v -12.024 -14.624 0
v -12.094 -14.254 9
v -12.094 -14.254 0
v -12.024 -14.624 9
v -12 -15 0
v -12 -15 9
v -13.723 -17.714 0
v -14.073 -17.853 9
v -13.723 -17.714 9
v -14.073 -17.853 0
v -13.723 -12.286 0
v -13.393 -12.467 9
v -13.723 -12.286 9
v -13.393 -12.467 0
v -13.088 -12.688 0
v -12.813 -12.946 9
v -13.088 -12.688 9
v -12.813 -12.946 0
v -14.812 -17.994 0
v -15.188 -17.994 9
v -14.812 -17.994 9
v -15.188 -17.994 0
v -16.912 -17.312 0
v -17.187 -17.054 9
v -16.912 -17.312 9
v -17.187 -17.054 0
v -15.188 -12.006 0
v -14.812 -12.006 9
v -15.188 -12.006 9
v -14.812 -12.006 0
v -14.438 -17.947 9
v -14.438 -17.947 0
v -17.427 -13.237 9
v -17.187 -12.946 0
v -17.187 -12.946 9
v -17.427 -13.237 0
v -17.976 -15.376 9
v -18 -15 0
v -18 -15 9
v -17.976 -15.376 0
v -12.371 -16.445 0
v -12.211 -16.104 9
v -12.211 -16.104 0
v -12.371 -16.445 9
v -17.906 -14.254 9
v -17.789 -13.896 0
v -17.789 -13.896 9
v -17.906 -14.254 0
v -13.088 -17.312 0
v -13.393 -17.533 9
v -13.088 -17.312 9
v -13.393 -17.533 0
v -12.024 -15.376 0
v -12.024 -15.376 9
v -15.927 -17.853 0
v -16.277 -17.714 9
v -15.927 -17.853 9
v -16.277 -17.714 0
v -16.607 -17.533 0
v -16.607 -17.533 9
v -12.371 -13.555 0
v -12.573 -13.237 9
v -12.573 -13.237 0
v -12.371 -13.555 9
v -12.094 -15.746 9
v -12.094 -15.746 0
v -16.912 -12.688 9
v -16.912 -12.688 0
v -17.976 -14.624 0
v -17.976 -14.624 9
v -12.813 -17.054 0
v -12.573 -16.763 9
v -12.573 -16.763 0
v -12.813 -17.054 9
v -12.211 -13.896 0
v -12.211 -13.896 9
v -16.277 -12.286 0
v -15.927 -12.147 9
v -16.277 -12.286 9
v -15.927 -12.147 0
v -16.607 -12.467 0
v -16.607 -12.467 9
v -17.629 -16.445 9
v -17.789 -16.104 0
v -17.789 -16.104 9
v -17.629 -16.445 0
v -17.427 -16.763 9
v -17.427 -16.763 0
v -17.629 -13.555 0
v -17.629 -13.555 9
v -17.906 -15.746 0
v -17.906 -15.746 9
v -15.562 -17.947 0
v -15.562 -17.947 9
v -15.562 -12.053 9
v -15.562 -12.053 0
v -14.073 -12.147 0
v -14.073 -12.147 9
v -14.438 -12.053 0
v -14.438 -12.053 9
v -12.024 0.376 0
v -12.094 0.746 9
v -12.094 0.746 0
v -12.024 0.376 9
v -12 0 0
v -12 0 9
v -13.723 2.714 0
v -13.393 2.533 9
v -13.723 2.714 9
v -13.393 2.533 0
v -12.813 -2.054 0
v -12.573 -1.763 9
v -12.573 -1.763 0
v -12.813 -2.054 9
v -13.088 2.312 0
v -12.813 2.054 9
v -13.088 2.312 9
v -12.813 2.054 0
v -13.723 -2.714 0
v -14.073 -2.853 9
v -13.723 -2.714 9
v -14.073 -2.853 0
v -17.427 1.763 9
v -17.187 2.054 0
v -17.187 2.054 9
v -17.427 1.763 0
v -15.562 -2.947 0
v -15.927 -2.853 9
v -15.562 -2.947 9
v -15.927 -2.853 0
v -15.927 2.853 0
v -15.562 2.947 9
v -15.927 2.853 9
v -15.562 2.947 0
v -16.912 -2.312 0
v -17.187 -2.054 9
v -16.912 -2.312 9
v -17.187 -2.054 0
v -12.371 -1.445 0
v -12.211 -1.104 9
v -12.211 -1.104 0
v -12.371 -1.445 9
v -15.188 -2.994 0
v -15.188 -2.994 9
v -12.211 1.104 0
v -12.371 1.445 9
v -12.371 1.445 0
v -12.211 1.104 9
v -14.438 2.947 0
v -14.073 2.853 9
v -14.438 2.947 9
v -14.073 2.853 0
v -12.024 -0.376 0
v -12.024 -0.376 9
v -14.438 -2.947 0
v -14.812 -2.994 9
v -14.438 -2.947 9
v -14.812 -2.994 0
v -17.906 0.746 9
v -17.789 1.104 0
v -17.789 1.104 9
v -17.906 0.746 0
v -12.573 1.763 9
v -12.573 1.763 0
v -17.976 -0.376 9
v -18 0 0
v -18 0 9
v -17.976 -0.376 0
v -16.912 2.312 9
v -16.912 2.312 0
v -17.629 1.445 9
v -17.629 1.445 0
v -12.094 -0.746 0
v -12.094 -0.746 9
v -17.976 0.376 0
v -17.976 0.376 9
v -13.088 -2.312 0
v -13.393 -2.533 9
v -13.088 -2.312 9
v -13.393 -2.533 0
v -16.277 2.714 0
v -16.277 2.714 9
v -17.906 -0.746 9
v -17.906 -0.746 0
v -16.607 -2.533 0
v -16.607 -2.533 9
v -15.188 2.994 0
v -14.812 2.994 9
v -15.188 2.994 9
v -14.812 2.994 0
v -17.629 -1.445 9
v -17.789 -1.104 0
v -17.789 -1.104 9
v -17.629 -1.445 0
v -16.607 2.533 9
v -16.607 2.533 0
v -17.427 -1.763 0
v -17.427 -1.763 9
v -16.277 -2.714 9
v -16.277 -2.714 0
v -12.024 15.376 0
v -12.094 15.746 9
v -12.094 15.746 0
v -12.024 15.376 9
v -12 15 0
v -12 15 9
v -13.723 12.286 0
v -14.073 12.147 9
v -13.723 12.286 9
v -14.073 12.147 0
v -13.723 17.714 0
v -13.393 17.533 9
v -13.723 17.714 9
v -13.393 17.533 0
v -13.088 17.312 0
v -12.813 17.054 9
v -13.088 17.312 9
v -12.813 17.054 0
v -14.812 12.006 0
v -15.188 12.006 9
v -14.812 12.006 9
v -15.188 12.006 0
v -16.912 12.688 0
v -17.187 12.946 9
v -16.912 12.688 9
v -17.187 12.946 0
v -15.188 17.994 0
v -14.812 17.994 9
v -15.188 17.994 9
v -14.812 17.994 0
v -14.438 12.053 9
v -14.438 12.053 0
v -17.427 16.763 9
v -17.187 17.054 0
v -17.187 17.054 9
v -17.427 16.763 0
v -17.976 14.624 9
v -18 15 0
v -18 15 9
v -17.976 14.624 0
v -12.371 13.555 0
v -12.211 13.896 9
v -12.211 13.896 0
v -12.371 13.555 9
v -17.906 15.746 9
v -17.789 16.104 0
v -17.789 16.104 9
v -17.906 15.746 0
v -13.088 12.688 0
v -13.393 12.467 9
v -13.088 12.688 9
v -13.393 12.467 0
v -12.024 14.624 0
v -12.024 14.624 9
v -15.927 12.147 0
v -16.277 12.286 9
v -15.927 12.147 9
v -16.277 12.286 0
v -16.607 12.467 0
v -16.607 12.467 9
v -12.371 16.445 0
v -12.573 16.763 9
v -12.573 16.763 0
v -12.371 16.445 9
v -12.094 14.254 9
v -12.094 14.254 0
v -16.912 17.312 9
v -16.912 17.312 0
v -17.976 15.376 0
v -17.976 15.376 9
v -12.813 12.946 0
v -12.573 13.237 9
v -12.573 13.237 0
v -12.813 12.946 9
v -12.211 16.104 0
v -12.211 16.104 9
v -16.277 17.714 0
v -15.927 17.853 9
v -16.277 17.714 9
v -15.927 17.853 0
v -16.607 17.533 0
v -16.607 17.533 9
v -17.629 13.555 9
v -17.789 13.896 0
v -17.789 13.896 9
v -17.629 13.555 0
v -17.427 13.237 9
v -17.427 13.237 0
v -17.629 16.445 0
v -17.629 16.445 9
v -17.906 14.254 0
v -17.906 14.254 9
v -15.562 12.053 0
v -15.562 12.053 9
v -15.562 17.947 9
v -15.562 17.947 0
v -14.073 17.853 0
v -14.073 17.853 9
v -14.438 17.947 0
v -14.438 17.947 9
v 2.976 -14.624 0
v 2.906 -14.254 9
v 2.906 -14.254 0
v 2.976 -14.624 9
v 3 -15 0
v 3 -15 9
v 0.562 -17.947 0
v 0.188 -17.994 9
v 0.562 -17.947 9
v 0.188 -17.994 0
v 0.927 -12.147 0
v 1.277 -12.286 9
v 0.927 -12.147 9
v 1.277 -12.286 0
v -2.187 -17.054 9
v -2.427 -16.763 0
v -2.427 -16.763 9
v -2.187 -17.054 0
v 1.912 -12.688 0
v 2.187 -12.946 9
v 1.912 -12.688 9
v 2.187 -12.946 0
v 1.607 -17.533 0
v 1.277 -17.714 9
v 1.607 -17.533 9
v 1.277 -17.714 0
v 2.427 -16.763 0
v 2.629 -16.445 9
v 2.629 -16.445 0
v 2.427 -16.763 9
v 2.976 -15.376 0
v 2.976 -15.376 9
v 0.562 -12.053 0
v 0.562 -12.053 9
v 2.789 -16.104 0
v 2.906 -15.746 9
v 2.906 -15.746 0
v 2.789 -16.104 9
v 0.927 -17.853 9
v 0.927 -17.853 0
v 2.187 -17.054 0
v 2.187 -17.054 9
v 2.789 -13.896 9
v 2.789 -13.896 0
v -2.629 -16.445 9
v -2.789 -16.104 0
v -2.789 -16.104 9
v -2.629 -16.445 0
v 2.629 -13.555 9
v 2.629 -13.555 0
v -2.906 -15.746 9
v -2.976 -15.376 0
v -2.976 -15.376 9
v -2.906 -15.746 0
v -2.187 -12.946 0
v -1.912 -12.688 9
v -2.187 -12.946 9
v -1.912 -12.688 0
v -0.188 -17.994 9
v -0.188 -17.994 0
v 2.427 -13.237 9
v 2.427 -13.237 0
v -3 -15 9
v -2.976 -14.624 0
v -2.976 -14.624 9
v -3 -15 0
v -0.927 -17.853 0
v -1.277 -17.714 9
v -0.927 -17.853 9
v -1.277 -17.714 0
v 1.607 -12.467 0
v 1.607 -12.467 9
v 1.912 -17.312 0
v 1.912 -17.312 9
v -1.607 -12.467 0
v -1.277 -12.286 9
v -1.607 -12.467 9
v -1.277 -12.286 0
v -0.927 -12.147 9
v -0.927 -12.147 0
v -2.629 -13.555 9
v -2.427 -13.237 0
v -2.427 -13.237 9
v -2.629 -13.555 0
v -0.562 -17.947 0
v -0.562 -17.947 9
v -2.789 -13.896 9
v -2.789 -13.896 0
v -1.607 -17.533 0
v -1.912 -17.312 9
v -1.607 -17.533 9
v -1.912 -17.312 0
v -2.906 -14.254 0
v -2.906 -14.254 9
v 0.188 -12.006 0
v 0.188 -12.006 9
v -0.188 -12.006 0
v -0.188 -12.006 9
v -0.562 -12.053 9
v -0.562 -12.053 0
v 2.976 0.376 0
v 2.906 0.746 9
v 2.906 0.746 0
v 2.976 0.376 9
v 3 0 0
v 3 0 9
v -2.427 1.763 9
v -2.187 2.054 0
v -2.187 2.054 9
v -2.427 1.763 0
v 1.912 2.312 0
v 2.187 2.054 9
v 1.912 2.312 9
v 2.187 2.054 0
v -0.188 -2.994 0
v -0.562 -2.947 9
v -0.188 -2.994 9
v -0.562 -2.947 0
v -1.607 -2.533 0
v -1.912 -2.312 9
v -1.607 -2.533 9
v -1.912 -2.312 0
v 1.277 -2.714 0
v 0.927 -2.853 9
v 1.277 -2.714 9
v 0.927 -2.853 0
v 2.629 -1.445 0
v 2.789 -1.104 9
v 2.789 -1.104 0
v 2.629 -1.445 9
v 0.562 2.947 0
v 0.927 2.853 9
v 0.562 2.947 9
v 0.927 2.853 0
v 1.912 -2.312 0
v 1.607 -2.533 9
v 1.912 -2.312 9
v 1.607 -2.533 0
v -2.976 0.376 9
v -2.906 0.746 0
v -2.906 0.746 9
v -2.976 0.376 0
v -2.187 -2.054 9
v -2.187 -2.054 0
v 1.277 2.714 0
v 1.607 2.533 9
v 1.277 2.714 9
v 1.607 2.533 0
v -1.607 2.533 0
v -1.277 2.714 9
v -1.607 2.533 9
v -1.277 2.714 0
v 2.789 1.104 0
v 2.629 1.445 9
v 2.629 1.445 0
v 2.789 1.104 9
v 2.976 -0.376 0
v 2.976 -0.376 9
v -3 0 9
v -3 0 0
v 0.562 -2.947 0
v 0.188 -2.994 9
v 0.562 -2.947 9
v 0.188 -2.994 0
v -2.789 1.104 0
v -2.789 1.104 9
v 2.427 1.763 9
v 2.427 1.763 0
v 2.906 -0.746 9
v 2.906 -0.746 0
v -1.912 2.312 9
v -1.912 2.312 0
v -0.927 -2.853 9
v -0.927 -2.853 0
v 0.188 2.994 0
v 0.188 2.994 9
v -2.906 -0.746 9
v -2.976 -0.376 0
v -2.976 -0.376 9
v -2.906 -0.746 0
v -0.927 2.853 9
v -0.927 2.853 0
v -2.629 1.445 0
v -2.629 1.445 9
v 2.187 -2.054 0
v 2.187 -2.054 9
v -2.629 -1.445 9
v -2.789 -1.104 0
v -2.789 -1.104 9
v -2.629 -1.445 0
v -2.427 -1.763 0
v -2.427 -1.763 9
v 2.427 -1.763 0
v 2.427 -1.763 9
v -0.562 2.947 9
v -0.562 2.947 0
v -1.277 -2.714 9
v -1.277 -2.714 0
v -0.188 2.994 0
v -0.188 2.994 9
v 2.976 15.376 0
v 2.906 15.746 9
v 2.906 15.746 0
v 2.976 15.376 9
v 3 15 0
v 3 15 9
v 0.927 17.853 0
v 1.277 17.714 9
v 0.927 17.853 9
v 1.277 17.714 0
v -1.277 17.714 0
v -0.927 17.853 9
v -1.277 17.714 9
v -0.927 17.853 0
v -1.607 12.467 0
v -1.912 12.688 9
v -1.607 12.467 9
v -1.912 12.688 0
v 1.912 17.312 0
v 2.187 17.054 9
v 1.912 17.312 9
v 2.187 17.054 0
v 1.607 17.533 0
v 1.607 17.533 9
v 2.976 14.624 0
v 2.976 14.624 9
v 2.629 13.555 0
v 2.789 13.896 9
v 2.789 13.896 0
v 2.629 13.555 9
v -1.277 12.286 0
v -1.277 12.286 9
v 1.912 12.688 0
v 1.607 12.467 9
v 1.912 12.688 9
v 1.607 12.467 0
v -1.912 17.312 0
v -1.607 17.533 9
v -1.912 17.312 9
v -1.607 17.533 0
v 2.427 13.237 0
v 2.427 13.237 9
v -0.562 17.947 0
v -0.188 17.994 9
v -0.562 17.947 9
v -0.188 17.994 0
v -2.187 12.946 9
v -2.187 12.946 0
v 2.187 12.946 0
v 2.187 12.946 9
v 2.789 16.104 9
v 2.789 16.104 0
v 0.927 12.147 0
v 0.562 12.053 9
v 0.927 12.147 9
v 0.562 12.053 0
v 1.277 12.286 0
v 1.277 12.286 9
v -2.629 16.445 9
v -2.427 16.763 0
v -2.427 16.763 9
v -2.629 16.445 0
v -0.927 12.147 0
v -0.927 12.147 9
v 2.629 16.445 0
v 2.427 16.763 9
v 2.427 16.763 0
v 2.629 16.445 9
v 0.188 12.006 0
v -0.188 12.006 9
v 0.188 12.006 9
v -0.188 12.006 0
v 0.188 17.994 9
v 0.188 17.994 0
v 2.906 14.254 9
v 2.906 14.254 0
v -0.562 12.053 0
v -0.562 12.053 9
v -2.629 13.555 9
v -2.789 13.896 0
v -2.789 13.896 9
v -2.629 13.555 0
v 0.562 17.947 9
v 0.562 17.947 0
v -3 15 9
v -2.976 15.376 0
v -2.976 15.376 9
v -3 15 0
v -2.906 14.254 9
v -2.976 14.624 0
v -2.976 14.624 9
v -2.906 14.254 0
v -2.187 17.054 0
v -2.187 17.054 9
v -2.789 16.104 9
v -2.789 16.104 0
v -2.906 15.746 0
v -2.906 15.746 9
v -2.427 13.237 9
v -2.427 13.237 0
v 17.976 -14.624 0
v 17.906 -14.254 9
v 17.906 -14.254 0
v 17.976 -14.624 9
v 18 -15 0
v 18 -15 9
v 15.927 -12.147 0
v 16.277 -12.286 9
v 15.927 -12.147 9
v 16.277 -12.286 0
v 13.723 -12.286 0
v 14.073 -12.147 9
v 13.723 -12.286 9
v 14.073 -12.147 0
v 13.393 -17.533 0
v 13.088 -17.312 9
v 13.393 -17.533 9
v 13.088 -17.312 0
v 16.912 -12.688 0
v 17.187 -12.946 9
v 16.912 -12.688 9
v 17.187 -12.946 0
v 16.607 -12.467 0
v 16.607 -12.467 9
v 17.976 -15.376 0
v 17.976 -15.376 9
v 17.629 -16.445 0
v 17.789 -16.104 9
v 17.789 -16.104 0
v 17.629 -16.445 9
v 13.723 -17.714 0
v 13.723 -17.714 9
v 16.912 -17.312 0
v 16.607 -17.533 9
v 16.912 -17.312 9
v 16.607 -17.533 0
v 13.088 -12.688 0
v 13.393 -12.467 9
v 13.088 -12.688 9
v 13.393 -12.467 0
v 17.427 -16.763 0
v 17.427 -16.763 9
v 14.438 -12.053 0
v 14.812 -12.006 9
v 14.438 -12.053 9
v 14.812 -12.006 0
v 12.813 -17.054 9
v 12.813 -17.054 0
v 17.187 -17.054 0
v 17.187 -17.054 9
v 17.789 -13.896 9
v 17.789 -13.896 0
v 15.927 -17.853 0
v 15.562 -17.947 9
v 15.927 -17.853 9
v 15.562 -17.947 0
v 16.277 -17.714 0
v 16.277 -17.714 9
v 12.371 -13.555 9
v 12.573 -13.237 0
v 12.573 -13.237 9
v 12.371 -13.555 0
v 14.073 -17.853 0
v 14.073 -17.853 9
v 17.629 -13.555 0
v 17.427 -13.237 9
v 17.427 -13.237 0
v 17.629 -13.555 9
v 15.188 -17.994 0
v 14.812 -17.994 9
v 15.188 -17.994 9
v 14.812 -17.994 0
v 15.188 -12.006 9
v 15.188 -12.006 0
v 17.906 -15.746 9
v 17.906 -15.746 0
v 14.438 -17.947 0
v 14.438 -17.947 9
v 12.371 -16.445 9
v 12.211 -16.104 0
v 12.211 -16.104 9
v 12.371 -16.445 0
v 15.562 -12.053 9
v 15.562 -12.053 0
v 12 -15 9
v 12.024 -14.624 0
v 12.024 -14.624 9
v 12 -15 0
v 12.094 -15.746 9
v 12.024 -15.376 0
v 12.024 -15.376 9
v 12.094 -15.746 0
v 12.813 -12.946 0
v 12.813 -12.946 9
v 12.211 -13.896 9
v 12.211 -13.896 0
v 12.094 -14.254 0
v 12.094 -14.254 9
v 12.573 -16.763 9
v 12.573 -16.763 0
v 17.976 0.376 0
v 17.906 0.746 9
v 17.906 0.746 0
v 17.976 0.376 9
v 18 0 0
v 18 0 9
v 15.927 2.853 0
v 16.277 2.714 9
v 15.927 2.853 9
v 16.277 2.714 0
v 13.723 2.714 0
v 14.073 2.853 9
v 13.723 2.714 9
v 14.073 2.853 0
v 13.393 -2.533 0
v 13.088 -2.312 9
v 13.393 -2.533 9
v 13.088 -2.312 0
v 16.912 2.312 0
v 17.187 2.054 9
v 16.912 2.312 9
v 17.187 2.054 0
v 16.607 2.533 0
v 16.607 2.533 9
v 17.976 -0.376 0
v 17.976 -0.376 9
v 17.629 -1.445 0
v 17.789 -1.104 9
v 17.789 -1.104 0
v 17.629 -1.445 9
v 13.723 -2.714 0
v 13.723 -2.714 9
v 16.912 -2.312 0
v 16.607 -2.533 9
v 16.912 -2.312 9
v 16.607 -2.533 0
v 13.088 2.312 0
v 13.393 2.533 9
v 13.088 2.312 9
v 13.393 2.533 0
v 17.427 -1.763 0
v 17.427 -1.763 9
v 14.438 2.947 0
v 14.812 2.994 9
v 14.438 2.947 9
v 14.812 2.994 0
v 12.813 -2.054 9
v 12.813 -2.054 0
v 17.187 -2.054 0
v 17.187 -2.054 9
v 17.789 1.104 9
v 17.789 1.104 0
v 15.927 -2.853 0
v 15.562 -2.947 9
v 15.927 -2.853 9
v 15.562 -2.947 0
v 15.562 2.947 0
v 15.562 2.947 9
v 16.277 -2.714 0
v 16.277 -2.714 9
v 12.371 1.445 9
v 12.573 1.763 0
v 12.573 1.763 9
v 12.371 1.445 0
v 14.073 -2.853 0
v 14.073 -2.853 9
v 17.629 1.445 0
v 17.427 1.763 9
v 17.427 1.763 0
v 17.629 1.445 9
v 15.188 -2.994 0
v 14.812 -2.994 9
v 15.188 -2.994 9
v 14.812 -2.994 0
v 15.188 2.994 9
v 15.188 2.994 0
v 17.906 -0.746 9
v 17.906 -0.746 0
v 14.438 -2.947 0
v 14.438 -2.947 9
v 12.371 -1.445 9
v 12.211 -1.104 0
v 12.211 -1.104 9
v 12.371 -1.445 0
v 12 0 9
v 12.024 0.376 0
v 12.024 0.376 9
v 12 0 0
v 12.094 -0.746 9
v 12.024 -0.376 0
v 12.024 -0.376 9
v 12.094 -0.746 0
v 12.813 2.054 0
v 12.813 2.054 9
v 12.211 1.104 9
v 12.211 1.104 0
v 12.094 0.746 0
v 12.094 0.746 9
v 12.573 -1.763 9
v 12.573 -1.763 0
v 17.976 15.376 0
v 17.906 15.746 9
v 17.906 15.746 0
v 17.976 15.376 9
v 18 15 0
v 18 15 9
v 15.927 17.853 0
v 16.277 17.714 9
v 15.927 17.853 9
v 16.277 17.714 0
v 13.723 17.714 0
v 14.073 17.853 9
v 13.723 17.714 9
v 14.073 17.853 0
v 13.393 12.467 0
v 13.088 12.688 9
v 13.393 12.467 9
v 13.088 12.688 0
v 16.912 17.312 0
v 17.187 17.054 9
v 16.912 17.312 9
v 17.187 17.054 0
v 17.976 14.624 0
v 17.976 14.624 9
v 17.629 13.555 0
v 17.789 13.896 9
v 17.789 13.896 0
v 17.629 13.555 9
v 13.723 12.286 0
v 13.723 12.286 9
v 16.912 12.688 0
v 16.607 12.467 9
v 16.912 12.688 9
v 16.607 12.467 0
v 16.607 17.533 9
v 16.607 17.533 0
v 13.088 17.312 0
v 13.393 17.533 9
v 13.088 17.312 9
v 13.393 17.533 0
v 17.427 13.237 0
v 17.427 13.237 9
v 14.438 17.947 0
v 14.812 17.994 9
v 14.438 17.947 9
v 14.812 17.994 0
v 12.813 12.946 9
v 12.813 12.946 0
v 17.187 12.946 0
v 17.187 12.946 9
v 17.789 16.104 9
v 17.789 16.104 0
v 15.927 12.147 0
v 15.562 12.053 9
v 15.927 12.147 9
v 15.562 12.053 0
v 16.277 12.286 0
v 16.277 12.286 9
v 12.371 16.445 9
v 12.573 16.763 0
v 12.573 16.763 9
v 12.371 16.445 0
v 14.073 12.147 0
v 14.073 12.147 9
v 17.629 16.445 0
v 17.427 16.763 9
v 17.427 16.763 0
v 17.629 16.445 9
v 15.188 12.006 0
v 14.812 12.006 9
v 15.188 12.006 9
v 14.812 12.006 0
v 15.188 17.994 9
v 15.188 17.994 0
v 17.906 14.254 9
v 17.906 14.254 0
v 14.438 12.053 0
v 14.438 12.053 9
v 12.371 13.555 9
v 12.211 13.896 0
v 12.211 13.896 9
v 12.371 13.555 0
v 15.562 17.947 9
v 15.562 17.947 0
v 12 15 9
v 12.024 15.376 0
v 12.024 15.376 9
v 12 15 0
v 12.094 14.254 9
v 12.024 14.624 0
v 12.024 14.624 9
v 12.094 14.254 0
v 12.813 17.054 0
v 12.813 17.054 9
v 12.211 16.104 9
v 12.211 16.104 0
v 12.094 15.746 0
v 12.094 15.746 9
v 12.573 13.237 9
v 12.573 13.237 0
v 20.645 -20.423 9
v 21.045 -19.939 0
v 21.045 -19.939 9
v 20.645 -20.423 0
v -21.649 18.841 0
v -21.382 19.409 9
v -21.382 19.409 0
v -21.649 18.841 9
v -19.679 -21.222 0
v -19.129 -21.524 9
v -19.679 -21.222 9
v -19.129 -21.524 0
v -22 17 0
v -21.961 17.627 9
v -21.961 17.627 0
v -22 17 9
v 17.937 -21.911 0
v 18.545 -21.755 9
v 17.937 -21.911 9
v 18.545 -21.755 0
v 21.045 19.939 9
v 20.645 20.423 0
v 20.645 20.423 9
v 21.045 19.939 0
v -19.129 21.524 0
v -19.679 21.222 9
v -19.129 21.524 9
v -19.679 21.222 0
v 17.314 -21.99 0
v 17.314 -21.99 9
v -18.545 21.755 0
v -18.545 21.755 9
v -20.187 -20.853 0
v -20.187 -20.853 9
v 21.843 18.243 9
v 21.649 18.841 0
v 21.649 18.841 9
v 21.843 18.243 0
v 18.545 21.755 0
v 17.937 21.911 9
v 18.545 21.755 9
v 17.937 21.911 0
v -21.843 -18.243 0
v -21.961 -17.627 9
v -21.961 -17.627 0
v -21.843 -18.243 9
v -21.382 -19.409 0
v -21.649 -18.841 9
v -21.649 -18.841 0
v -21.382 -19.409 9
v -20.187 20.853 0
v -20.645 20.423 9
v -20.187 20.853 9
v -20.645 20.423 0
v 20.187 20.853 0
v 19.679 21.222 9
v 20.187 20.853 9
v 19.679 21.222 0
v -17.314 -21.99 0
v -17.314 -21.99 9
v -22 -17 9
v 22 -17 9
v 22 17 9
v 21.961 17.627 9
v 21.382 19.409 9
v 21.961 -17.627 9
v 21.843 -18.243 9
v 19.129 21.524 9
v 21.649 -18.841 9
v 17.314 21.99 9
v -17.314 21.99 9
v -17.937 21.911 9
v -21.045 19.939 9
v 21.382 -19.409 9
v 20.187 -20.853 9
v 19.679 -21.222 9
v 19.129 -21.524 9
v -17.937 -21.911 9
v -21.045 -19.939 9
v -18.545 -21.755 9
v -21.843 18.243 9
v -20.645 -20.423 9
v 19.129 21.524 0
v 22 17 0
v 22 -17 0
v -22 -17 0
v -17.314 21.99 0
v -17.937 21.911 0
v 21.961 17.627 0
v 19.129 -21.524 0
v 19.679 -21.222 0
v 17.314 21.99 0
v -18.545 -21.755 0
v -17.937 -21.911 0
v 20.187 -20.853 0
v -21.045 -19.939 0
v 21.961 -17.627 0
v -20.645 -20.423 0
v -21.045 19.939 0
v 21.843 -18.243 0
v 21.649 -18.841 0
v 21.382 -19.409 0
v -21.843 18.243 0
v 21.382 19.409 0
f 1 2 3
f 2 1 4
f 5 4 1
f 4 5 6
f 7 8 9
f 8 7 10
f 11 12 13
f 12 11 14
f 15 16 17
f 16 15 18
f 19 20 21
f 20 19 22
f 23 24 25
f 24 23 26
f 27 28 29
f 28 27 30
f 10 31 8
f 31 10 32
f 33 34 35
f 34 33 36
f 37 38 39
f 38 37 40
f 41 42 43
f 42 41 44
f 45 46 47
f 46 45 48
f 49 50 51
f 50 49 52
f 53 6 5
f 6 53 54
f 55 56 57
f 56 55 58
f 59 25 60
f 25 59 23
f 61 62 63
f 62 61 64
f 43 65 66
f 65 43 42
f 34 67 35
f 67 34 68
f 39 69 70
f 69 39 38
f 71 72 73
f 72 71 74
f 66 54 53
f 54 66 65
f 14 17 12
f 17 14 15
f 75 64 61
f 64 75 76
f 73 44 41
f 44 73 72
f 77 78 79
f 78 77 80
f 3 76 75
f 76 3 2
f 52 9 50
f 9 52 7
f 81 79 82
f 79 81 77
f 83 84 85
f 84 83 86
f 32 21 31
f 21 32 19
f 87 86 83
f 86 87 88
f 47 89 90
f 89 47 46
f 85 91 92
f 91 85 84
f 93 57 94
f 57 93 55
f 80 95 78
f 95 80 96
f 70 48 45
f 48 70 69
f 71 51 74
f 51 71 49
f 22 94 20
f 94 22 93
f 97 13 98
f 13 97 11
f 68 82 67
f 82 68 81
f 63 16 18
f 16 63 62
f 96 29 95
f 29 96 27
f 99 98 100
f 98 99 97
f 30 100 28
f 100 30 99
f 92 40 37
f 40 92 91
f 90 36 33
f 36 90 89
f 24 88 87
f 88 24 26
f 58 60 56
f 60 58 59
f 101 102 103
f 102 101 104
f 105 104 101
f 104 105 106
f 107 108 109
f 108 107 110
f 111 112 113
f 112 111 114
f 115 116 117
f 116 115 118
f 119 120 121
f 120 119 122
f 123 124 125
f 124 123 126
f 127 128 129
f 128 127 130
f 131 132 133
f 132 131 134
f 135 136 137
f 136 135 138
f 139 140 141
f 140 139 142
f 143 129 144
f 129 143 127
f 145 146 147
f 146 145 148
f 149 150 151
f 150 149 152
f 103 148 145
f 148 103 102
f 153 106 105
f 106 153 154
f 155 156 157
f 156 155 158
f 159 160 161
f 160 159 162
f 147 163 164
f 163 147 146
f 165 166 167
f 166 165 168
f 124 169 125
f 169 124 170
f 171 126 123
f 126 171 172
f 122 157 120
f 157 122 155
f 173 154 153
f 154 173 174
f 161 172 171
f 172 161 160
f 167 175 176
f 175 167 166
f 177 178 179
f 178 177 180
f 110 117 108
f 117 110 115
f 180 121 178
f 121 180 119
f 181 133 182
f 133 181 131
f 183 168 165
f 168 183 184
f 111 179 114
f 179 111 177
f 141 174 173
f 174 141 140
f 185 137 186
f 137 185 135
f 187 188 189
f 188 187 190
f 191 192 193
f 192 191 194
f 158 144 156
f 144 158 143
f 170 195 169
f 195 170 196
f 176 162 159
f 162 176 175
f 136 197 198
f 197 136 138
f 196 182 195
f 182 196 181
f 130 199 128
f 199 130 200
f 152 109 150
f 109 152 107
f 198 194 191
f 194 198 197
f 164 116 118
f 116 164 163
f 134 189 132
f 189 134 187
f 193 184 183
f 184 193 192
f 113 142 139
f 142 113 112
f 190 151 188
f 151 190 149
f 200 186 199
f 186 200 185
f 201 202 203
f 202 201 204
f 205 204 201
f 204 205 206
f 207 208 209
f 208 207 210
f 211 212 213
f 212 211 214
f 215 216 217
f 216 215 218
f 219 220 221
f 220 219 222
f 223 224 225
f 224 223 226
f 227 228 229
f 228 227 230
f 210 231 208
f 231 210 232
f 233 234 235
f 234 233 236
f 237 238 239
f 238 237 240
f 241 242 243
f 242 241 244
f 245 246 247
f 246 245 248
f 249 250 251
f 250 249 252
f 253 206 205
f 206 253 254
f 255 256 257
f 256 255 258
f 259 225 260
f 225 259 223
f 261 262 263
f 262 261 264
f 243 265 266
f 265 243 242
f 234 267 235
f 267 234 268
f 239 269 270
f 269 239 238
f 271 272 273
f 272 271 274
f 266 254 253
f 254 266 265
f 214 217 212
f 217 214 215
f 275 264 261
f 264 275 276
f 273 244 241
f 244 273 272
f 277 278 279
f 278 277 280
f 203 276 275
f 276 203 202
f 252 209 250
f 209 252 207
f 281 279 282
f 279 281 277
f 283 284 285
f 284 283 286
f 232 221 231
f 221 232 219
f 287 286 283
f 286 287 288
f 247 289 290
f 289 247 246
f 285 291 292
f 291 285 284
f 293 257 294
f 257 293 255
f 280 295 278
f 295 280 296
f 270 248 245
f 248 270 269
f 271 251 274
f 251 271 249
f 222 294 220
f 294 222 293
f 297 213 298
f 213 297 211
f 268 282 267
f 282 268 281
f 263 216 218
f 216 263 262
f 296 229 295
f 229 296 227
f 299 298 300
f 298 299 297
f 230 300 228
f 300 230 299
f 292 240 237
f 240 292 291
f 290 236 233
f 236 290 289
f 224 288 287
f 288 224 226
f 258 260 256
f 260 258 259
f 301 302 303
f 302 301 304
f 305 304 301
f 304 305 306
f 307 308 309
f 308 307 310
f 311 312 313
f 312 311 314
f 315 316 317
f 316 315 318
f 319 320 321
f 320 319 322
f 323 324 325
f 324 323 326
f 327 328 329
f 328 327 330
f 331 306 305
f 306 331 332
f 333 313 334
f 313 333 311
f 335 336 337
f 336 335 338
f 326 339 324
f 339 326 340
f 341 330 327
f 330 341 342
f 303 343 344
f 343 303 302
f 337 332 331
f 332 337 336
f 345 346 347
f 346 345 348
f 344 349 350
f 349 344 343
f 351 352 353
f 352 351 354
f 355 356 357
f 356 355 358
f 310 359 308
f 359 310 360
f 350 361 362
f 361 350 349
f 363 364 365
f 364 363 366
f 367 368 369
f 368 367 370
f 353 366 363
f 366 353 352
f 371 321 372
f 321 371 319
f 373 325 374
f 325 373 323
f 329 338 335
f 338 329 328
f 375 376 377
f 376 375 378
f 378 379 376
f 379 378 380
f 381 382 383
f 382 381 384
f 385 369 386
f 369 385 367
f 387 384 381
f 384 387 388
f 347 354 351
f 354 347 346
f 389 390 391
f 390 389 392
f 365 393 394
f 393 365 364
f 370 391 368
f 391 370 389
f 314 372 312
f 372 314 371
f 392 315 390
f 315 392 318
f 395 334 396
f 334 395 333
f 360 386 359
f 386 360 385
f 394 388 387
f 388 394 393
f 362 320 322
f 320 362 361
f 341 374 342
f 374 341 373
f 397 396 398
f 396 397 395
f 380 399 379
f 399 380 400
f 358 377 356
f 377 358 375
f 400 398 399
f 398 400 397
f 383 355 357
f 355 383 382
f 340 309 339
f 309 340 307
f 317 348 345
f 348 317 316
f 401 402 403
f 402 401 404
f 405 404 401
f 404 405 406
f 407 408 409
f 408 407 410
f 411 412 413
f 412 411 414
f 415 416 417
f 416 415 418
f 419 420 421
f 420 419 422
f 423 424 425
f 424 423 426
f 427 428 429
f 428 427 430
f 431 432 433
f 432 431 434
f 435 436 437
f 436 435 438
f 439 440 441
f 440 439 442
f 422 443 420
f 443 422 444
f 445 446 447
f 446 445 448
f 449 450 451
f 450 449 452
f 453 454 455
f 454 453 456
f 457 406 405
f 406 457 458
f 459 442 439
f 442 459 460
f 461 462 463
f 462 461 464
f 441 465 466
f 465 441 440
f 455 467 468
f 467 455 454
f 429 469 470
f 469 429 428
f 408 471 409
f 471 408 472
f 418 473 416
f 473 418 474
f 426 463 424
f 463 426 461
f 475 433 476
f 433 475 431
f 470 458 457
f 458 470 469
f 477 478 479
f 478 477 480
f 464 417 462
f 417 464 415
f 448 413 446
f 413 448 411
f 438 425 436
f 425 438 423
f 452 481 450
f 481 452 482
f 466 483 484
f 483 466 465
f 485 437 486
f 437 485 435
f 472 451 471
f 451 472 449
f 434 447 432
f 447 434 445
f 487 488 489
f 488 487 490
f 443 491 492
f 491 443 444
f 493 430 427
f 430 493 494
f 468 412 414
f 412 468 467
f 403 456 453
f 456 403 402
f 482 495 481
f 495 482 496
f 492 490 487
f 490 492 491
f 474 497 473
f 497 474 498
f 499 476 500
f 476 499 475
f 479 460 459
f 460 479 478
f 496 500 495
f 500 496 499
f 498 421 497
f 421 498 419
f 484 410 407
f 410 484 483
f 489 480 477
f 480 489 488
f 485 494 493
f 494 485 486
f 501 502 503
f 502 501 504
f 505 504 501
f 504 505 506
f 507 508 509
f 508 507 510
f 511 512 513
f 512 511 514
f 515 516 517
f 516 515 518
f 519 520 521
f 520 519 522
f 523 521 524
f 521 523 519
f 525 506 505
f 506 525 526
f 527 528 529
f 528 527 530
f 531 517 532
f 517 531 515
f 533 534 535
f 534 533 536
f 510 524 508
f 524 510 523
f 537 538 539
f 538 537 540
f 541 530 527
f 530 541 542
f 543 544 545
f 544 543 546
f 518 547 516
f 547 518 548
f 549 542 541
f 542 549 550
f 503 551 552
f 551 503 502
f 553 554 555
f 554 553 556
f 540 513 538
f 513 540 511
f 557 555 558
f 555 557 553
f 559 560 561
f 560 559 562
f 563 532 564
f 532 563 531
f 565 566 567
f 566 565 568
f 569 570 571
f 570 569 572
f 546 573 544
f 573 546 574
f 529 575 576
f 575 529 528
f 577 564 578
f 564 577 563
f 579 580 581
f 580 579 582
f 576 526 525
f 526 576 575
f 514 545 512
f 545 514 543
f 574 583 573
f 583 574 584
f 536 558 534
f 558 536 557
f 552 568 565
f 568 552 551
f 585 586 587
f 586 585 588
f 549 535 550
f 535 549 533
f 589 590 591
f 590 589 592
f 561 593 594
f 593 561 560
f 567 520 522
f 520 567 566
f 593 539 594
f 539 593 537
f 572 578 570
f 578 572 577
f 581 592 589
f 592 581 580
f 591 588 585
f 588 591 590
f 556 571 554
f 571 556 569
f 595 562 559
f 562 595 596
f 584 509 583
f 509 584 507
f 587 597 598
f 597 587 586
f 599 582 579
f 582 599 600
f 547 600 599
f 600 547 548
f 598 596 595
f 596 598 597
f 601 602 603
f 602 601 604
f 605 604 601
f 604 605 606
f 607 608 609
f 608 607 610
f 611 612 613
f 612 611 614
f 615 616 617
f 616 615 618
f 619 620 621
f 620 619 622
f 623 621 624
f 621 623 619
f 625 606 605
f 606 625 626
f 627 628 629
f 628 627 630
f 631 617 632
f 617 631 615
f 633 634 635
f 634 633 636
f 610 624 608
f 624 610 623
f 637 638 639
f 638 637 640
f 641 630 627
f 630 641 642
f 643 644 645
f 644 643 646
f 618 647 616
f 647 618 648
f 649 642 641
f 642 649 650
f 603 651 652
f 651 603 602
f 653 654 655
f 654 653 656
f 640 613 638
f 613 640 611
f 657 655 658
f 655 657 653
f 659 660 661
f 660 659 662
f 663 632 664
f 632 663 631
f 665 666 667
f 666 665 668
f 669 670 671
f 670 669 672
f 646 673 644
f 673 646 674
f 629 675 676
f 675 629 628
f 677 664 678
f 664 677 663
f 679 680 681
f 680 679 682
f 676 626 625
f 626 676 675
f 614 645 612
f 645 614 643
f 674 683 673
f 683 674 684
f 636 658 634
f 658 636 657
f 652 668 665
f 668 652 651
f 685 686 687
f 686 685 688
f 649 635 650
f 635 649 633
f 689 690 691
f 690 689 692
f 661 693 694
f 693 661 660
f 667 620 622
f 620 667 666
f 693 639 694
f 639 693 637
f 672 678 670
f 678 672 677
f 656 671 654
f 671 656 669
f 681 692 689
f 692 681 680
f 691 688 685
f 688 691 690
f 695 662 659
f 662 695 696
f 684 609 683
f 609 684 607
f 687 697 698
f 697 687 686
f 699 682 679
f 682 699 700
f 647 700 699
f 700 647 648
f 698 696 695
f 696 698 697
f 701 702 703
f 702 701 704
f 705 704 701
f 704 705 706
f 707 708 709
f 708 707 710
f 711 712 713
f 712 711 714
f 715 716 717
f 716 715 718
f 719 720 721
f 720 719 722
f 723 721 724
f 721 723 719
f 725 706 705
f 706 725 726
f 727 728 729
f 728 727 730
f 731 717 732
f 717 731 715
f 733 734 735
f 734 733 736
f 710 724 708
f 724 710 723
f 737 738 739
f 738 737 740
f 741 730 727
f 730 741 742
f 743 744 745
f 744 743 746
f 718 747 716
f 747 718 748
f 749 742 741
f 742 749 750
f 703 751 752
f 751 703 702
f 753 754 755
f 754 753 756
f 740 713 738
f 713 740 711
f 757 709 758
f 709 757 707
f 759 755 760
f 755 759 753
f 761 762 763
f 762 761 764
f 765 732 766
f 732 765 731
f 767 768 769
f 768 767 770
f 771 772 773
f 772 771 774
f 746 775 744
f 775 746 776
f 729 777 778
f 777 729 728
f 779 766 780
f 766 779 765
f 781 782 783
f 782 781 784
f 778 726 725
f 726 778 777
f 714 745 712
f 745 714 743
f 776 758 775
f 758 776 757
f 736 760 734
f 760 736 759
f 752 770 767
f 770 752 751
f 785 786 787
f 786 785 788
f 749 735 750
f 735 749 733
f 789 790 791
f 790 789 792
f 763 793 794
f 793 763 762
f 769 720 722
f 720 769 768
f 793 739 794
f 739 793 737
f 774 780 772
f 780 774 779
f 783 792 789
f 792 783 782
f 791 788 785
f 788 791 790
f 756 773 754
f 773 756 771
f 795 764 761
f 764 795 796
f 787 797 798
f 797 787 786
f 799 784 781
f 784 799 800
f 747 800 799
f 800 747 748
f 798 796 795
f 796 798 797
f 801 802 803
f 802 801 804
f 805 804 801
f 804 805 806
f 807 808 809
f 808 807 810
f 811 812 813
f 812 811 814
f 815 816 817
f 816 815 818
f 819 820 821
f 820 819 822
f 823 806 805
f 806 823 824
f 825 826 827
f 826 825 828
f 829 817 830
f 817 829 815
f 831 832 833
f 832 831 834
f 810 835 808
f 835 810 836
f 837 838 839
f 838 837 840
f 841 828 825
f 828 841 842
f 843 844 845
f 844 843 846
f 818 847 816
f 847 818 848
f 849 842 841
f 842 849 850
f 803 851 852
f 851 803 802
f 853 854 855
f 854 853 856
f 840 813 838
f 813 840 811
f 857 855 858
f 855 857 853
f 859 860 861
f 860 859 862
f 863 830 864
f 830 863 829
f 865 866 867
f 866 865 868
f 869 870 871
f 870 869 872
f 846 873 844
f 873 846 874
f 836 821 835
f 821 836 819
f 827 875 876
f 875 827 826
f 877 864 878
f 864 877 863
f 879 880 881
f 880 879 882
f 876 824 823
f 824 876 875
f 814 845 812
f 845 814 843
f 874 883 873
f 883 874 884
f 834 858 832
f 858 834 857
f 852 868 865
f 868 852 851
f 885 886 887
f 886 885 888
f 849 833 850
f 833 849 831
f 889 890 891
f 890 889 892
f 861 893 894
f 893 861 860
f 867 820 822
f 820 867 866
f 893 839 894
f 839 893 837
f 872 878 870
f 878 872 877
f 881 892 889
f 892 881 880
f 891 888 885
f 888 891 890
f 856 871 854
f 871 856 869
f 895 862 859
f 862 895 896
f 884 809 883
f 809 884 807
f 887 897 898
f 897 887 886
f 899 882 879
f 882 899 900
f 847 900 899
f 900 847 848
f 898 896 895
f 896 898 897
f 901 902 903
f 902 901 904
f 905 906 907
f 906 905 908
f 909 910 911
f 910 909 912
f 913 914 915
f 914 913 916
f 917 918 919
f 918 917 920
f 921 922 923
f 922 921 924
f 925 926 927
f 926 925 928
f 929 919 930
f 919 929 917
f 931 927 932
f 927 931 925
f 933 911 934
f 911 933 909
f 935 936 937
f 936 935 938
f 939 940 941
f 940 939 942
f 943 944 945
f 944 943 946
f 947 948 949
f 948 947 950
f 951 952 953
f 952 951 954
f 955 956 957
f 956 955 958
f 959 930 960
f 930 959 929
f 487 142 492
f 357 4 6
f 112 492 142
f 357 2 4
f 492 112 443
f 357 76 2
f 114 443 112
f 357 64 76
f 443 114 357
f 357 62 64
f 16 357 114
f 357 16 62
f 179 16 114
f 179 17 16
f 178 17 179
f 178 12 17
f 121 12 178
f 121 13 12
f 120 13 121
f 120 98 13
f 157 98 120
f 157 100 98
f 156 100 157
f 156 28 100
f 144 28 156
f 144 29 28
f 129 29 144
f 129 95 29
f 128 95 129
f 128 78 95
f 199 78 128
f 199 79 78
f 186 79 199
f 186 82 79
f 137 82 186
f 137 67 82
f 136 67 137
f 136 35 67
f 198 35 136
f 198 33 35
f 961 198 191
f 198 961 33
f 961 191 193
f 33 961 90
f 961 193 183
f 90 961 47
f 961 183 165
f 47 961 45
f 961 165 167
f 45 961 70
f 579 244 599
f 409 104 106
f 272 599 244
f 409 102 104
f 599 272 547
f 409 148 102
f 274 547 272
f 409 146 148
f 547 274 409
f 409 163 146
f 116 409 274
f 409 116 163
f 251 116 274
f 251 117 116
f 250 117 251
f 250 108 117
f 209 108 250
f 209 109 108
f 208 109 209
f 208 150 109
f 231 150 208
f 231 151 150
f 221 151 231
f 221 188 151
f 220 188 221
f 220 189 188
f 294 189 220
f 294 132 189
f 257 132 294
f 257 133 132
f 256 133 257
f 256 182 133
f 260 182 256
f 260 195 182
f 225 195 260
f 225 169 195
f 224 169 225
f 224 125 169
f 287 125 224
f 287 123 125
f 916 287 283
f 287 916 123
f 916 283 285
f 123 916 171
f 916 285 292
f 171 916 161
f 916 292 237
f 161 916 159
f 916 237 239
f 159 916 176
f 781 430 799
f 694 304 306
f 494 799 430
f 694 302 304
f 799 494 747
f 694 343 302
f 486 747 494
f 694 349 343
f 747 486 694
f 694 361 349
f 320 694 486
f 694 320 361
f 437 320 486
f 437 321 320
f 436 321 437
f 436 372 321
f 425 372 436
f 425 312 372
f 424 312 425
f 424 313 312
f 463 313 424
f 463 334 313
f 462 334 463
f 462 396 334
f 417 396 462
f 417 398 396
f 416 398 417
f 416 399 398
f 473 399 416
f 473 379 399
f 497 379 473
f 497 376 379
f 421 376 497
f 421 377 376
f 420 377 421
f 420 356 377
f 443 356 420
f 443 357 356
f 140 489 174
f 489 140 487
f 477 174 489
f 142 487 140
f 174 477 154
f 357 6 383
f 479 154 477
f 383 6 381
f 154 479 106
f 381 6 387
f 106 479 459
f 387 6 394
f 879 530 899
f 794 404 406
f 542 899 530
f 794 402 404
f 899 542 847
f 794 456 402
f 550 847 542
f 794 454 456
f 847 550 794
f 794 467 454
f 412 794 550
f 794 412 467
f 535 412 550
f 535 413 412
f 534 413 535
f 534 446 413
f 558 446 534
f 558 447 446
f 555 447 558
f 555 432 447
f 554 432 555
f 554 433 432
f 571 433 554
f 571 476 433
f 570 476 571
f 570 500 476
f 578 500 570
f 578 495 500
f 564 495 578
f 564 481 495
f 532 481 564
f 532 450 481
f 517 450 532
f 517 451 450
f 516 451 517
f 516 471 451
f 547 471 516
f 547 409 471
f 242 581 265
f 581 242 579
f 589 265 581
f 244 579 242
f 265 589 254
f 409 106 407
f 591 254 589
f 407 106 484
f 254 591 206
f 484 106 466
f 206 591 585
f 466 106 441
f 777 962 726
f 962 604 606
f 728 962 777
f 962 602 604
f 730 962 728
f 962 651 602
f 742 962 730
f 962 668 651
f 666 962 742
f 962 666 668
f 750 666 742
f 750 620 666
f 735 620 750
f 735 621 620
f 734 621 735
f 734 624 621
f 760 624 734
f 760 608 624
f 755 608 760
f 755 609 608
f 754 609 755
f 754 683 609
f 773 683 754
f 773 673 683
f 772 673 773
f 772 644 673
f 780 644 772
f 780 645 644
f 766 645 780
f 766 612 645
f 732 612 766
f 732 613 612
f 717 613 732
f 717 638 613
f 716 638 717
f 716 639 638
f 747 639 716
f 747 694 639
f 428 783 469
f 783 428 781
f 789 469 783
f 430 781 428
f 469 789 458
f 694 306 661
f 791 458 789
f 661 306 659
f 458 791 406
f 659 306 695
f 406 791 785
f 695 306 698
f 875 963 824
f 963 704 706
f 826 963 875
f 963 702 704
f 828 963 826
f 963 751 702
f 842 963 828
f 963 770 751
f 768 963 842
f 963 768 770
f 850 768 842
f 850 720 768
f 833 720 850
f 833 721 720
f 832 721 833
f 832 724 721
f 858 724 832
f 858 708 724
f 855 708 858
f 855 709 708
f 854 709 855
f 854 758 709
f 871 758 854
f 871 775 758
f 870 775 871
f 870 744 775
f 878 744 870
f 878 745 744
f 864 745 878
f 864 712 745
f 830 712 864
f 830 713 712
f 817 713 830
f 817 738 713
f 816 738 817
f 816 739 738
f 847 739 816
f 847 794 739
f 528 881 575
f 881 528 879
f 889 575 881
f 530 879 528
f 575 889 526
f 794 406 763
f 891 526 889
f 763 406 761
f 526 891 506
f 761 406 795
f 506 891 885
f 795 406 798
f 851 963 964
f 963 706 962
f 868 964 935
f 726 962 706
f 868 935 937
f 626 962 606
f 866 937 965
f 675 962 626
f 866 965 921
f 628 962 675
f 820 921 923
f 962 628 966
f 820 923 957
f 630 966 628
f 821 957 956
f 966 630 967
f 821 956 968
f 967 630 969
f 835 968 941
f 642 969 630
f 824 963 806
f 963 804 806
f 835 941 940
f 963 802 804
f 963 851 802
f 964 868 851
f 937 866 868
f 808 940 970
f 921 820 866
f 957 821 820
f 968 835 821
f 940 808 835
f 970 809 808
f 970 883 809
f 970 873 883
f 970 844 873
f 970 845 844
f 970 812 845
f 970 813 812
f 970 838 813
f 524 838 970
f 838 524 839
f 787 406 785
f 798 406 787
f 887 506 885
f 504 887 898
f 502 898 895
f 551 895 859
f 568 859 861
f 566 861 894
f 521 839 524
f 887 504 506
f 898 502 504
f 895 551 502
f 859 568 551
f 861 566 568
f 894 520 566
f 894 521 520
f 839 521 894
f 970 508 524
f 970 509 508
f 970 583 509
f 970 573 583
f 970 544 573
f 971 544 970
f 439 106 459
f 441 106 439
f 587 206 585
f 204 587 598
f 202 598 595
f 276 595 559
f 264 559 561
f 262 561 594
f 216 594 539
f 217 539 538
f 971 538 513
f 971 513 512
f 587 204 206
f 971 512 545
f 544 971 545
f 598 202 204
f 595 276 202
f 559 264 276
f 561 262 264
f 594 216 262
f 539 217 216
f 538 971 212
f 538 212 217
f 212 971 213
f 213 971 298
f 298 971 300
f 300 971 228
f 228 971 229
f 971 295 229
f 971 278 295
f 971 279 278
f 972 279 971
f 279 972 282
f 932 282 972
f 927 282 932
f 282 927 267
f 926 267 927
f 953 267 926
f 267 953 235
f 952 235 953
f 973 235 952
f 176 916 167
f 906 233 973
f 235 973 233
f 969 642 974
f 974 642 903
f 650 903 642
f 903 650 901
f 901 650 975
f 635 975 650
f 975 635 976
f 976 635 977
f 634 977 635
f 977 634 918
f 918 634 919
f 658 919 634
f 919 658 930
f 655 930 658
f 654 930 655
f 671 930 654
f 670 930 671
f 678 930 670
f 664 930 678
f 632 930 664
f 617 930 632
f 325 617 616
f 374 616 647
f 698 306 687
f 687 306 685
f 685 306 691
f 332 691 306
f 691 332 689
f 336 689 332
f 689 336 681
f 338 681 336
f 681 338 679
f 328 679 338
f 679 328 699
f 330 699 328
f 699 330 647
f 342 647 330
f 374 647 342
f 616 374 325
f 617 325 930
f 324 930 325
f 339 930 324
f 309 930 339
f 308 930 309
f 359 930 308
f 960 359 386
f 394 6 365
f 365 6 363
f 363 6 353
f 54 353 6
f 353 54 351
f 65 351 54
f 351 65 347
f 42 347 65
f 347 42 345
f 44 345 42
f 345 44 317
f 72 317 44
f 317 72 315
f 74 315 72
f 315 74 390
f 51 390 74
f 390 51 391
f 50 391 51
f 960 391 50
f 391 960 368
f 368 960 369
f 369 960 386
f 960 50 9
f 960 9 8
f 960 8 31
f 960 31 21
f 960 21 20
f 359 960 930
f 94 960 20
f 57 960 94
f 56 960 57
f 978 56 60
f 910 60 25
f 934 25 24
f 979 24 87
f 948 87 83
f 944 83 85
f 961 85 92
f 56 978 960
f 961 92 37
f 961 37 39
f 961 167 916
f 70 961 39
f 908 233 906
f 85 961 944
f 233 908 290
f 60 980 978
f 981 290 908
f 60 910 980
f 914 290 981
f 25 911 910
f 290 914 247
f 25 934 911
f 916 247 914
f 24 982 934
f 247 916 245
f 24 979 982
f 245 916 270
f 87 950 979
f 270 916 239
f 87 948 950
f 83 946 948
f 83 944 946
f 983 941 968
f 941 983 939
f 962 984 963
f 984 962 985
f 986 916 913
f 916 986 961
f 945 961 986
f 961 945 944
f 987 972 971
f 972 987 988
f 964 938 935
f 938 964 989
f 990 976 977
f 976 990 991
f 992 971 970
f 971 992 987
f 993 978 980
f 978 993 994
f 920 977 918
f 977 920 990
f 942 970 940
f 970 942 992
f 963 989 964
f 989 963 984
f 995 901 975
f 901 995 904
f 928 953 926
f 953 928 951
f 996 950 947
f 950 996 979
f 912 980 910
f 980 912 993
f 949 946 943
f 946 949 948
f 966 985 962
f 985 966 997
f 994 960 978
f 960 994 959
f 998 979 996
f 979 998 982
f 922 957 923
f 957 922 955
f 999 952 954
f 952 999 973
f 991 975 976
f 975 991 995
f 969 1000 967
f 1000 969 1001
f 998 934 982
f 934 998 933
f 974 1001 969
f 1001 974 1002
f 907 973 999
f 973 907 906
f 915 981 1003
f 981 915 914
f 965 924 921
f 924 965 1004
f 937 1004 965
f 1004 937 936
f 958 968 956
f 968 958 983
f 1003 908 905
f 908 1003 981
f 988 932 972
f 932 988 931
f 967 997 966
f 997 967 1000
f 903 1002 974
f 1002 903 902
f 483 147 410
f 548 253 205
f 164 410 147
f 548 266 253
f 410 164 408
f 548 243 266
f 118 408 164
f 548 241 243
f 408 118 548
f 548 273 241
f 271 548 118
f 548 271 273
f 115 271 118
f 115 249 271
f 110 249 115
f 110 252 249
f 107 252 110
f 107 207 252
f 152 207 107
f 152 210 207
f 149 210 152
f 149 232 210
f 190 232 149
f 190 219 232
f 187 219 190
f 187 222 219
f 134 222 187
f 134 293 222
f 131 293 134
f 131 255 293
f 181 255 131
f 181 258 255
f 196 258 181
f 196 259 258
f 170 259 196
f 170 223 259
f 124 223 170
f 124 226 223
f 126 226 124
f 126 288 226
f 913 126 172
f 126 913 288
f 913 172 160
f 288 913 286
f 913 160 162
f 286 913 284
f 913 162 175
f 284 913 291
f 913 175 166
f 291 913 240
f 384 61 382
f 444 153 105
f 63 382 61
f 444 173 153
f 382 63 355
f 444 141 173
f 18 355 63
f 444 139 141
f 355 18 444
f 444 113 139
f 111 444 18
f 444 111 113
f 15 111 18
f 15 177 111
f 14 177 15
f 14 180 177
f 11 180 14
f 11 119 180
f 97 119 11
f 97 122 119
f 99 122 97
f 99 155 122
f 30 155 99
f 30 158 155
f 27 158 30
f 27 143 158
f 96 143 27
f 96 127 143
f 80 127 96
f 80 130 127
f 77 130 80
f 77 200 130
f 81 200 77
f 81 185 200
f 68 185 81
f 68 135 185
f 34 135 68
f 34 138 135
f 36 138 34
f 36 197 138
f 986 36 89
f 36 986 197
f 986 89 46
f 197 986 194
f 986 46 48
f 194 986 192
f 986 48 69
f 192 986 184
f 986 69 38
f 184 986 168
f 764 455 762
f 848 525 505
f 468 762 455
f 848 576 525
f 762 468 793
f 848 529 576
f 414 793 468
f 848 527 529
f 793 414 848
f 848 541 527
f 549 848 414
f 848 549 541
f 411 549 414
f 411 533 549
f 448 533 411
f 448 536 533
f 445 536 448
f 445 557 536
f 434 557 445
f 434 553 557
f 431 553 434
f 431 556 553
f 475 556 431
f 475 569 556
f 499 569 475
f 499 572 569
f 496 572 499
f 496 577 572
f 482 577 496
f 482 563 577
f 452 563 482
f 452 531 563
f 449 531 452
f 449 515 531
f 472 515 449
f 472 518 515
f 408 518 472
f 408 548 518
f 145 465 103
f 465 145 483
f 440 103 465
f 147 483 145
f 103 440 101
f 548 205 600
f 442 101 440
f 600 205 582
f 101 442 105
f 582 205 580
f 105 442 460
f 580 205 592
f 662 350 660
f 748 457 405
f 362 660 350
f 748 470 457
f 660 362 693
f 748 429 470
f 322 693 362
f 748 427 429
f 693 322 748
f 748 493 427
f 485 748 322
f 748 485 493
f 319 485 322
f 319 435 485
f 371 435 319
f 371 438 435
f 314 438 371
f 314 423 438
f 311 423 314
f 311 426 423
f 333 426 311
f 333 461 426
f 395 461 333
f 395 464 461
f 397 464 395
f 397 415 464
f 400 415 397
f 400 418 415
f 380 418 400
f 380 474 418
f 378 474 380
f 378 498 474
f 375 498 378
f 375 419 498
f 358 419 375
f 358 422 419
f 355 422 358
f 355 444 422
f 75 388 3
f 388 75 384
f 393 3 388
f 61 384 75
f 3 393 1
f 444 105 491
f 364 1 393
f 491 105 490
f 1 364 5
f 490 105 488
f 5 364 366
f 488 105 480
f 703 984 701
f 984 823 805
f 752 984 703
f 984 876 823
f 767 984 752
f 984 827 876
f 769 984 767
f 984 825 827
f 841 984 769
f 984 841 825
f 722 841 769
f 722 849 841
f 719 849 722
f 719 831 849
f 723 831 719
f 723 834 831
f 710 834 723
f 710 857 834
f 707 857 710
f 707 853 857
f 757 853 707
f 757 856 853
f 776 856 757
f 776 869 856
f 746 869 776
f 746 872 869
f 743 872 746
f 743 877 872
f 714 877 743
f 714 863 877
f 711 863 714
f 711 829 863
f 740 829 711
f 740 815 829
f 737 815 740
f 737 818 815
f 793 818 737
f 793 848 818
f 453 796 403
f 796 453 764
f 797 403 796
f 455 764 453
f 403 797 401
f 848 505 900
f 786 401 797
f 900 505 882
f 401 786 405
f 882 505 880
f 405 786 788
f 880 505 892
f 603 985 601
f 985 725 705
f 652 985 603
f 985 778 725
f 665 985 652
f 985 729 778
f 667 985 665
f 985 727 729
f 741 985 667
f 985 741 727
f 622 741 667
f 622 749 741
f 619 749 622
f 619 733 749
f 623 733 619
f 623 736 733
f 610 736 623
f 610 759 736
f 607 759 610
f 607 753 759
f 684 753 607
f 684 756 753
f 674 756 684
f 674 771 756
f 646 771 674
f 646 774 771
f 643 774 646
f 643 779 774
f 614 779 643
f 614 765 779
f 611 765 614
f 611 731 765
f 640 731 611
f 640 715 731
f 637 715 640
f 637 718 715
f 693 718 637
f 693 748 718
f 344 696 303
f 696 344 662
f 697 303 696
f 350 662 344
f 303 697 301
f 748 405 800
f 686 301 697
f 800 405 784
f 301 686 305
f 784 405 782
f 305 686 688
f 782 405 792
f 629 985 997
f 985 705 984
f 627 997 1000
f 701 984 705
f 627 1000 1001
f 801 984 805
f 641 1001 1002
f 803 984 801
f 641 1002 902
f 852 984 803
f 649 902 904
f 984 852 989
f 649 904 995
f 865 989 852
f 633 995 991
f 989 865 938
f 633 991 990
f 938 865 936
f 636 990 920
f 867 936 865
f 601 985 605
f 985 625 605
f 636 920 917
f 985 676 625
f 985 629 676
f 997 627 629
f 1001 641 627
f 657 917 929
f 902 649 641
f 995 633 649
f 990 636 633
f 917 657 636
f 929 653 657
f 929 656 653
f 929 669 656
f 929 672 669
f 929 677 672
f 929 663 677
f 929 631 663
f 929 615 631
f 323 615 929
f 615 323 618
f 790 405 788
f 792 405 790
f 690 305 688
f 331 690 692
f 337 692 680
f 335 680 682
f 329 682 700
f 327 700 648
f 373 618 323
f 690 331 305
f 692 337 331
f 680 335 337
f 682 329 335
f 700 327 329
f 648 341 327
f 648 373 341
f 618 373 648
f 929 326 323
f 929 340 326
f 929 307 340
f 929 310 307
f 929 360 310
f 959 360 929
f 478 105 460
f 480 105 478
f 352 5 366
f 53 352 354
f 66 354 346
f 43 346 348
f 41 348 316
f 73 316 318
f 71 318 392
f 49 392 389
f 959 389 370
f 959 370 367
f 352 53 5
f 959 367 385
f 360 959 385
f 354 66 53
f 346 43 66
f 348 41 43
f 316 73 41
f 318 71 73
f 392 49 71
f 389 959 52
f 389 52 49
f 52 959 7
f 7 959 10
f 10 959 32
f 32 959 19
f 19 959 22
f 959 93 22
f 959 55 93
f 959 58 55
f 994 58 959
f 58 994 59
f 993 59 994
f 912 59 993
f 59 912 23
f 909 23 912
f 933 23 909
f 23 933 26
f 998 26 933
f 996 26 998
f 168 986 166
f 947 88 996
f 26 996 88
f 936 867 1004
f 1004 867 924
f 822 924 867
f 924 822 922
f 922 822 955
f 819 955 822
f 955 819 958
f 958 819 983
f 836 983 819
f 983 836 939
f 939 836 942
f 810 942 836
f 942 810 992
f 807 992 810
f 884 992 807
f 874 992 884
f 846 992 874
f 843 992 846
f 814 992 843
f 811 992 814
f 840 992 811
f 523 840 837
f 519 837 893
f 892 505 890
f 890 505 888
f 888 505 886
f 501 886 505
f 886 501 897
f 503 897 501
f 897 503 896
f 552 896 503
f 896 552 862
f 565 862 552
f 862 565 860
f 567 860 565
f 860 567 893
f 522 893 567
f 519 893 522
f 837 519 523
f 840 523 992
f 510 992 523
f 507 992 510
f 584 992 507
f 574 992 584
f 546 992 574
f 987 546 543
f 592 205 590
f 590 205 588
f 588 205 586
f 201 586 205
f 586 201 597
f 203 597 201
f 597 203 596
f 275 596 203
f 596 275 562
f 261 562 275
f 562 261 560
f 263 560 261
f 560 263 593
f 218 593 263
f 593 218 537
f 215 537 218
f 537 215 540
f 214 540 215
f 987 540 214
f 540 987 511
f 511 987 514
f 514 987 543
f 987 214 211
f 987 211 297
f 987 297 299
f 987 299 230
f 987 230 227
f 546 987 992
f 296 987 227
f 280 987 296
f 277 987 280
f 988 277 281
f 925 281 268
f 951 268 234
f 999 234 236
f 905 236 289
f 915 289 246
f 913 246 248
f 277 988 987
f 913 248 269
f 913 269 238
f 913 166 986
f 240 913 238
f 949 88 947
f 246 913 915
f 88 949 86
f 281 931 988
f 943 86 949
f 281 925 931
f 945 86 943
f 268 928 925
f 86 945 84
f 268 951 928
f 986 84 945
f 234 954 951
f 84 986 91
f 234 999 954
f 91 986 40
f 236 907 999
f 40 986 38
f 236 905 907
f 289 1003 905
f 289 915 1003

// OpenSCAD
$fn = 50;


difference() {
	union() {
		hull() {
			translate(v = [-17.0000000000, 17.0000000000, 0]) {
				cylinder(h = 9, r = 5);
			}
			translate(v = [17.0000000000, 17.0000000000, 0]) {
				cylinder(h = 9, r = 5);
			}
			translate(v = [-17.0000000000, -17.0000000000, 0]) {
				cylinder(h = 9, r = 5);
			}
			translate(v = [17.0000000000, -17.0000000000, 0]) {
				cylinder(h = 9, r = 5);
			}
		}
	}
	union() {
		translate(v = [-15.0000000000, -15.0000000000, 0]) {
			translate(v = [0, 0, -100]) {
				cylinder(h = 200, r = 3.0000000000);
			}
		}
		translate(v = [-15.0000000000, 0.0000000000, 0]) {
			translate(v = [0, 0, -100]) {
				cylinder(h = 200, r = 3.0000000000);
			}
		}
		translate(v = [-15.0000000000, 15.0000000000, 0]) {
			translate(v = [0, 0, -100]) {
				cylinder(h = 200, r = 3.0000000000);
			}
		}
		translate(v = [0.0000000000, -15.0000000000, 0]) {
			translate(v = [0, 0, -100]) {
				cylinder(h = 200, r = 3.0000000000);
			}
		}
		translate(v = [0, 0, -100]) {
			cylinder(h = 200, r = 3.0000000000);
		}
		translate(v = [0.0000000000, 15.0000000000, 0]) {
			translate(v = [0, 0, -100]) {
				cylinder(h = 200, r = 3.0000000000);
			}
		}
		translate(v = [15.0000000000, -15.0000000000, 0]) {
			translate(v = [0, 0, -100]) {
				cylinder(h = 200, r = 3.0000000000);
			}
		}
		translate(v = [15.0000000000, 0.0000000000, 0]) {
			translate(v = [0, 0, -100]) {
				cylinder(h = 200, r = 3.0000000000);
			}
		}
		translate(v = [15.0000000000, 15.0000000000, 0]) {
			translate(v = [0, 0, -100]) {
				cylinder(h = 200, r = 3.0000000000);
			}
		}
	}
}
